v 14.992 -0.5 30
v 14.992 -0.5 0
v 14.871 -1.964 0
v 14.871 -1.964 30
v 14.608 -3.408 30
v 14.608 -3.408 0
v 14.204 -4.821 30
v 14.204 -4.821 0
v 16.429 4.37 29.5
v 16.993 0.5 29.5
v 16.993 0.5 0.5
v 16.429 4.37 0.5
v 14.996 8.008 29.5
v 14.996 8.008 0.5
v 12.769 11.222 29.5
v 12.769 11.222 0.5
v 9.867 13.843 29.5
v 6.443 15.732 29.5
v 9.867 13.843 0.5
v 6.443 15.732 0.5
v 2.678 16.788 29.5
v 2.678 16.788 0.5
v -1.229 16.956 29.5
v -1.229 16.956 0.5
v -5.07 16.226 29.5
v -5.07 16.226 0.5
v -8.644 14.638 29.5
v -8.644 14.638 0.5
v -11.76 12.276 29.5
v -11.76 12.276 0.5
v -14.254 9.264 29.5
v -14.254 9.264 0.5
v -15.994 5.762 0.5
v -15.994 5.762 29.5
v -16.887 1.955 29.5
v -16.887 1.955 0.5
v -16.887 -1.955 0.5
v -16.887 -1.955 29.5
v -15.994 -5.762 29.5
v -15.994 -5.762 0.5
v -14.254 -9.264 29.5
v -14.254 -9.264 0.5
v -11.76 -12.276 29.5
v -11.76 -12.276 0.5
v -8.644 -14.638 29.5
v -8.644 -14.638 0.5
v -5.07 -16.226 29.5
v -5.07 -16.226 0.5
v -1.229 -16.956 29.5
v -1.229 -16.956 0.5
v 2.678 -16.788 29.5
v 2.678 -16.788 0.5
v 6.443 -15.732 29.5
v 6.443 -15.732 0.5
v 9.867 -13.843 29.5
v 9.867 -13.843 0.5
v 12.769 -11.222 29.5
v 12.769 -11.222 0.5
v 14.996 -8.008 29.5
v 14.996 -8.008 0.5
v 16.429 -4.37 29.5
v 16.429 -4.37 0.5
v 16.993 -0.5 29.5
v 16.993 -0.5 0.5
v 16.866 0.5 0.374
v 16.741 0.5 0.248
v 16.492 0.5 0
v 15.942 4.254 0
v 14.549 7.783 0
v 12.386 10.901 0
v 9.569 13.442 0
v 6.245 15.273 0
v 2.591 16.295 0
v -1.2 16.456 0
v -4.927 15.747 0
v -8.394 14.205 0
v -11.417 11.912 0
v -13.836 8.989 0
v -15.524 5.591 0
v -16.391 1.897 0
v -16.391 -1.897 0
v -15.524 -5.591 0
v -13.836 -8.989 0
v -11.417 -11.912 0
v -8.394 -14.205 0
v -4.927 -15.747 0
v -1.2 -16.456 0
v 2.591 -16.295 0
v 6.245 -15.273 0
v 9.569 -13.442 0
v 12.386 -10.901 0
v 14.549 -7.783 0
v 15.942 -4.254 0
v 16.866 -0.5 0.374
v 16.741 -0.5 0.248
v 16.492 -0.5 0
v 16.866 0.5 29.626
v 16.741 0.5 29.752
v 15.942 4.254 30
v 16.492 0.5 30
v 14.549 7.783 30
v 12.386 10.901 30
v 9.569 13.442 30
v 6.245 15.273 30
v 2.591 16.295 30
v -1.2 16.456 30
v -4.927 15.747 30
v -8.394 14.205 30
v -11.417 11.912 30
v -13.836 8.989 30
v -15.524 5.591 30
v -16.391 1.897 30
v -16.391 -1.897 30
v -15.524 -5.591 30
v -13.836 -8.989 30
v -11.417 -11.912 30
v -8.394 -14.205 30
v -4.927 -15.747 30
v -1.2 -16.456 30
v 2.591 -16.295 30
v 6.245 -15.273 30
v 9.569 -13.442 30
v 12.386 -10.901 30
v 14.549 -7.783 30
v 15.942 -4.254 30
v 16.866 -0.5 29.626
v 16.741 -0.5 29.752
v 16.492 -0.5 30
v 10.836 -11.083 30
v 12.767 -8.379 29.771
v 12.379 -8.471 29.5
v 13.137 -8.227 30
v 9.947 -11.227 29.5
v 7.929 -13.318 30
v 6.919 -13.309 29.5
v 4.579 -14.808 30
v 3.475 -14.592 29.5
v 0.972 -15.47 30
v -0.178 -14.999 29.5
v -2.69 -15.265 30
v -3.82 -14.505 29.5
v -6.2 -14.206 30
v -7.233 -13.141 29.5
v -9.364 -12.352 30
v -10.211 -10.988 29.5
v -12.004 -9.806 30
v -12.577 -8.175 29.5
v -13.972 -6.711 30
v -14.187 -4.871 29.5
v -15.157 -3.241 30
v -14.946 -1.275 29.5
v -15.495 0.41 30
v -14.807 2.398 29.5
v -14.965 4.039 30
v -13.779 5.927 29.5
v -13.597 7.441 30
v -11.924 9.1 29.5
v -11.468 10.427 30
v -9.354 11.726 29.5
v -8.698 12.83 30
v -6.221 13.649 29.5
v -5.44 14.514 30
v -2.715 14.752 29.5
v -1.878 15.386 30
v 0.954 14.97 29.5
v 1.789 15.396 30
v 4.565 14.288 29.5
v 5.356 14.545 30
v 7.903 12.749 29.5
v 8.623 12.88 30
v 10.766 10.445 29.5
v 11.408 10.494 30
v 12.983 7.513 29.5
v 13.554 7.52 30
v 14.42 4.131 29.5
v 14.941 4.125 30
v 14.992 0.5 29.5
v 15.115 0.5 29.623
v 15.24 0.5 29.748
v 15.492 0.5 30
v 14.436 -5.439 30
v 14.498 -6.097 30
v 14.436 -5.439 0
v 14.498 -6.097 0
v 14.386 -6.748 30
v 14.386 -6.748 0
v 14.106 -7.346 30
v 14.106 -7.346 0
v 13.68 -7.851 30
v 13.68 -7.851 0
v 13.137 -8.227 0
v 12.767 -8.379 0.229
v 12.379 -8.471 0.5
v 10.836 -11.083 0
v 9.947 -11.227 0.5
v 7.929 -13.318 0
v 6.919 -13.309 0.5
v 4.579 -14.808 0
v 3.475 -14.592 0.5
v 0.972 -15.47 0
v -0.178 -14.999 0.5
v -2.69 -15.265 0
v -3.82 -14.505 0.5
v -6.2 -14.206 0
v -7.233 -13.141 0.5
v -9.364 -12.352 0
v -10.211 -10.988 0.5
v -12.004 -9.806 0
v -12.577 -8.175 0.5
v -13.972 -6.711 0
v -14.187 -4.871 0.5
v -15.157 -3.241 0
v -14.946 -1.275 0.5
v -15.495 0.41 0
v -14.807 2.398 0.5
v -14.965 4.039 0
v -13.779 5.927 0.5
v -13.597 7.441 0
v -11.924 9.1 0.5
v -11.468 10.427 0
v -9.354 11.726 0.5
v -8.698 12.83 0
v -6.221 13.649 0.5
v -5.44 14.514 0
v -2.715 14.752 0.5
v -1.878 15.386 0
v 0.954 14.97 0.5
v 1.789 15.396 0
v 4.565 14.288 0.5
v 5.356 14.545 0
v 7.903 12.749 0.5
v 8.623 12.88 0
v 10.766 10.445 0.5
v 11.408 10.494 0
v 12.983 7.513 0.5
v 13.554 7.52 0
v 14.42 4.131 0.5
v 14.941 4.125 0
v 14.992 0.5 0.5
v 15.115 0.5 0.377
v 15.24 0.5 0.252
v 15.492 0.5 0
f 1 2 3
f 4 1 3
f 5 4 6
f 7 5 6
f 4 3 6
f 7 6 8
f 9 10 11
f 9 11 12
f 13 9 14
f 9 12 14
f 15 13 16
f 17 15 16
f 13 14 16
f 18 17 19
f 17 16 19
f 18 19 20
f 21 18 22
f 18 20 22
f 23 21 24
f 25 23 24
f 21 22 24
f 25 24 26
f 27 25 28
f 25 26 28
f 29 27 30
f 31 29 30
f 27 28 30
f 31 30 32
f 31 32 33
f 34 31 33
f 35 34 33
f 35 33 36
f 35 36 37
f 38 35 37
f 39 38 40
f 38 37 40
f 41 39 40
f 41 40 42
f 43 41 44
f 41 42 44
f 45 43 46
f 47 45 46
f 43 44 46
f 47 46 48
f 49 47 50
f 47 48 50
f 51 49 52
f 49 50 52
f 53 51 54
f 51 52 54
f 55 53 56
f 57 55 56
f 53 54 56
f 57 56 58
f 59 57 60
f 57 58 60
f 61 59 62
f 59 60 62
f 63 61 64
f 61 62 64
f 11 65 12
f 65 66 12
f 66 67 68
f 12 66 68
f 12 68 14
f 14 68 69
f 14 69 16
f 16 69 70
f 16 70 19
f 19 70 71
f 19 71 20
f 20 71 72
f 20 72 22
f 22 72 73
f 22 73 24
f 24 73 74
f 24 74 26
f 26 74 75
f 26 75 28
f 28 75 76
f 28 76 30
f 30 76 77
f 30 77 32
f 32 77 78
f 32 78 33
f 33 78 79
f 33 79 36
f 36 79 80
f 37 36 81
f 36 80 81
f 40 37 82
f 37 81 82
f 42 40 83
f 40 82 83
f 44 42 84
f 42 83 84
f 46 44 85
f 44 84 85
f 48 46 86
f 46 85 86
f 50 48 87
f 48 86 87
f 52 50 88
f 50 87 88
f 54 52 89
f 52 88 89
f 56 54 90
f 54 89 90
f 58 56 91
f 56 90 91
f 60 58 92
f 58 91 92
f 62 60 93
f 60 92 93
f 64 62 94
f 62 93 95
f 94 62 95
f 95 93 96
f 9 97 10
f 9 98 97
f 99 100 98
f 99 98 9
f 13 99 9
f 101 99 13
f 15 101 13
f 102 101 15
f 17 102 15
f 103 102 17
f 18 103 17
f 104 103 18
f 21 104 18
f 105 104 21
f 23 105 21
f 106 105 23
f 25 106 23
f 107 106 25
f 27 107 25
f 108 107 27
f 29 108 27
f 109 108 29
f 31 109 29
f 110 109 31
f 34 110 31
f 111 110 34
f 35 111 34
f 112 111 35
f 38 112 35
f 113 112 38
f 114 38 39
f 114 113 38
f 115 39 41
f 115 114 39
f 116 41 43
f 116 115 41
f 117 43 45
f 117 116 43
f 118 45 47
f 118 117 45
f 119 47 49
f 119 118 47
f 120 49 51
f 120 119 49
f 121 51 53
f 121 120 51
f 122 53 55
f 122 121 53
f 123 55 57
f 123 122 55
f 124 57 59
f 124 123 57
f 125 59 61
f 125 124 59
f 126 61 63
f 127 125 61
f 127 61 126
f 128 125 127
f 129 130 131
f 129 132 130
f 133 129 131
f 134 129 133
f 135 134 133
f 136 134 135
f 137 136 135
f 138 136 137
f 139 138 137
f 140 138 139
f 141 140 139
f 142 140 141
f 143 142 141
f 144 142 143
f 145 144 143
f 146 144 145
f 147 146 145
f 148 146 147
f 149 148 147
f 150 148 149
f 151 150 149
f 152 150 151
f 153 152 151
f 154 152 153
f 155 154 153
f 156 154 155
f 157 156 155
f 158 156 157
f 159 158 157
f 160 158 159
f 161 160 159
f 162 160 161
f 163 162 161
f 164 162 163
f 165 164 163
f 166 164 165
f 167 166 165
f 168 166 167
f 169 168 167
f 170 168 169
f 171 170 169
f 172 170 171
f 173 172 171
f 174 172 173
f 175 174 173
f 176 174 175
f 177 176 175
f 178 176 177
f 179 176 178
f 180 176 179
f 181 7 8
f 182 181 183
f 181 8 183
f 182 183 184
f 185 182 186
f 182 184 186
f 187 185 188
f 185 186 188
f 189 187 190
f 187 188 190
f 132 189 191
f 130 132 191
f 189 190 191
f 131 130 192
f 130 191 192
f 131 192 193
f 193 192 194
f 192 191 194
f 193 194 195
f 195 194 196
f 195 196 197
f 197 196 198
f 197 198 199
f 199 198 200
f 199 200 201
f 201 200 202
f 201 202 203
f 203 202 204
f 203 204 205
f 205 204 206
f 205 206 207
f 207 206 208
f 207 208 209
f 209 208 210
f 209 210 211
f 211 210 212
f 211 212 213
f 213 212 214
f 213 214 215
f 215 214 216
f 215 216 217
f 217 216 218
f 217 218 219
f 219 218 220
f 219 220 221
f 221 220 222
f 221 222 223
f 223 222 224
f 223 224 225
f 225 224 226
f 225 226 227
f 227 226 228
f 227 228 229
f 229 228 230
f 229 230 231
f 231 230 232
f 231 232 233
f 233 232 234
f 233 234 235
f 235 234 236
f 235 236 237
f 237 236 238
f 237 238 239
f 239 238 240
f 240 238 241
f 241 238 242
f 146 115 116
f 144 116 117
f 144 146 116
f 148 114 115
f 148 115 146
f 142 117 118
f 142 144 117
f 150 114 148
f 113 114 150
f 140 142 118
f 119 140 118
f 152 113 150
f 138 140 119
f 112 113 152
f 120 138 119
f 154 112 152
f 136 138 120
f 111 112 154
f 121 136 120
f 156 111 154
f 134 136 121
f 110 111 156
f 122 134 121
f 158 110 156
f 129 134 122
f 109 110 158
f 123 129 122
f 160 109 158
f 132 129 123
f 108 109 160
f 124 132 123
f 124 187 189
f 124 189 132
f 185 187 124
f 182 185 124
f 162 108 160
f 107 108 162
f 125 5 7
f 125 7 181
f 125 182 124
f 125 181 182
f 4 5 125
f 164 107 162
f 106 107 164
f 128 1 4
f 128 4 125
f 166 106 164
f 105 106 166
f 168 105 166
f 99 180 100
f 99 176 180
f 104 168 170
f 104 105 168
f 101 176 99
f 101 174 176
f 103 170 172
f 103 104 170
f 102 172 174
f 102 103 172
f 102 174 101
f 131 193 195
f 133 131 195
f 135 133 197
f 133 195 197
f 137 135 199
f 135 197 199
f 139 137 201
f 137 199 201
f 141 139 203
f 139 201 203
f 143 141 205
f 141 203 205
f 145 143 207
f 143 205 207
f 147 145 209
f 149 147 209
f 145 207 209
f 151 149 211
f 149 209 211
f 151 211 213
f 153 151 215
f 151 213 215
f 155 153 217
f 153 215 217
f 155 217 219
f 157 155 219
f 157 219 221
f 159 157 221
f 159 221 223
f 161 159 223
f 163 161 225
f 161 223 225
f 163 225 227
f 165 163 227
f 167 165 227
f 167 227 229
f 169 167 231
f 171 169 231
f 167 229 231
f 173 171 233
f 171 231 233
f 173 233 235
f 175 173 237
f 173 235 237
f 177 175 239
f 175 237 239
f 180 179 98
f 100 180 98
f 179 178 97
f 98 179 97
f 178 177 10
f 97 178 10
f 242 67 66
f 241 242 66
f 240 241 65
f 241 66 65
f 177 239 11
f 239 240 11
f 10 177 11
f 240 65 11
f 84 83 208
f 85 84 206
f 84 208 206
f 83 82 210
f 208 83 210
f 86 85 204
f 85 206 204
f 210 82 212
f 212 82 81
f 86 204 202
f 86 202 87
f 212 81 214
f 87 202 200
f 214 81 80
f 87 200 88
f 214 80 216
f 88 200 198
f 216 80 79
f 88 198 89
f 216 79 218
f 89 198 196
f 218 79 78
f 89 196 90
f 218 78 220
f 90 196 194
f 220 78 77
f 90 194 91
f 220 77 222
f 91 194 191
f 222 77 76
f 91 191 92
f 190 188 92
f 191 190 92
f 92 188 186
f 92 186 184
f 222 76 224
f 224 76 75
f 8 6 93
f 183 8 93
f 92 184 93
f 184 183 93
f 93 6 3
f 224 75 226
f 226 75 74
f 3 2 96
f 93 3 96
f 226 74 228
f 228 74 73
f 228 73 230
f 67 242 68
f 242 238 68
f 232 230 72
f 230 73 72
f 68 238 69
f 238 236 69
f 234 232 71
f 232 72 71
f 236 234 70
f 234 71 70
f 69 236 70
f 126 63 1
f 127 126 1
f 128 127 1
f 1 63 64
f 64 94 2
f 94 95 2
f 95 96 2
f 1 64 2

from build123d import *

# Parameters (mm, degrees)
BASE_EXTRUSION_DEPTH = 30
CHANFREIN1_SIZE      = 0.5


with BuildPart() as part:
    # Esquisse1 → Base-Extrusion (new body)
    with BuildSketch(Plane.XY):
        with BuildLine():
            Line((14.991664351, 0.5), (16.992645468, 0.5))
            ThreePointArc((16.992645468, 0.5), (-17, 0), (16.992645468, -0.5))
            Line((16.992645468, -0.5), (14.991664351, -0.5))
            ThreePointArc((14.991664351, -0.5), (14.756961273, -2.689255286), (14.204299838, -4.820566991))
            ThreePointArc((14.204299838, -4.820566991), (14.236067977, -7.118033989), (12.379033495, -8.471099676))
            ThreePointArc((12.379033495, -8.471099676), (-14.401698945, 4.194170658), (14.991664351, 0.5))
        make_face()
    extrude(amount=BASE_EXTRUSION_DEPTH)

    # Chanfrein1
    chanfrein1_edges = [part.edges().sort_by_distance(p)[0] for p in [
        (-14.401698945, 4.194170658, 30),
        (-17, 0, 30),
        (-17, 0, 0),
        (-14.401698945, 4.194170658, 0),
    ]]
    chamfer(chanfrein1_edges, length=CHANFREIN1_SIZE)


solid = part.part
